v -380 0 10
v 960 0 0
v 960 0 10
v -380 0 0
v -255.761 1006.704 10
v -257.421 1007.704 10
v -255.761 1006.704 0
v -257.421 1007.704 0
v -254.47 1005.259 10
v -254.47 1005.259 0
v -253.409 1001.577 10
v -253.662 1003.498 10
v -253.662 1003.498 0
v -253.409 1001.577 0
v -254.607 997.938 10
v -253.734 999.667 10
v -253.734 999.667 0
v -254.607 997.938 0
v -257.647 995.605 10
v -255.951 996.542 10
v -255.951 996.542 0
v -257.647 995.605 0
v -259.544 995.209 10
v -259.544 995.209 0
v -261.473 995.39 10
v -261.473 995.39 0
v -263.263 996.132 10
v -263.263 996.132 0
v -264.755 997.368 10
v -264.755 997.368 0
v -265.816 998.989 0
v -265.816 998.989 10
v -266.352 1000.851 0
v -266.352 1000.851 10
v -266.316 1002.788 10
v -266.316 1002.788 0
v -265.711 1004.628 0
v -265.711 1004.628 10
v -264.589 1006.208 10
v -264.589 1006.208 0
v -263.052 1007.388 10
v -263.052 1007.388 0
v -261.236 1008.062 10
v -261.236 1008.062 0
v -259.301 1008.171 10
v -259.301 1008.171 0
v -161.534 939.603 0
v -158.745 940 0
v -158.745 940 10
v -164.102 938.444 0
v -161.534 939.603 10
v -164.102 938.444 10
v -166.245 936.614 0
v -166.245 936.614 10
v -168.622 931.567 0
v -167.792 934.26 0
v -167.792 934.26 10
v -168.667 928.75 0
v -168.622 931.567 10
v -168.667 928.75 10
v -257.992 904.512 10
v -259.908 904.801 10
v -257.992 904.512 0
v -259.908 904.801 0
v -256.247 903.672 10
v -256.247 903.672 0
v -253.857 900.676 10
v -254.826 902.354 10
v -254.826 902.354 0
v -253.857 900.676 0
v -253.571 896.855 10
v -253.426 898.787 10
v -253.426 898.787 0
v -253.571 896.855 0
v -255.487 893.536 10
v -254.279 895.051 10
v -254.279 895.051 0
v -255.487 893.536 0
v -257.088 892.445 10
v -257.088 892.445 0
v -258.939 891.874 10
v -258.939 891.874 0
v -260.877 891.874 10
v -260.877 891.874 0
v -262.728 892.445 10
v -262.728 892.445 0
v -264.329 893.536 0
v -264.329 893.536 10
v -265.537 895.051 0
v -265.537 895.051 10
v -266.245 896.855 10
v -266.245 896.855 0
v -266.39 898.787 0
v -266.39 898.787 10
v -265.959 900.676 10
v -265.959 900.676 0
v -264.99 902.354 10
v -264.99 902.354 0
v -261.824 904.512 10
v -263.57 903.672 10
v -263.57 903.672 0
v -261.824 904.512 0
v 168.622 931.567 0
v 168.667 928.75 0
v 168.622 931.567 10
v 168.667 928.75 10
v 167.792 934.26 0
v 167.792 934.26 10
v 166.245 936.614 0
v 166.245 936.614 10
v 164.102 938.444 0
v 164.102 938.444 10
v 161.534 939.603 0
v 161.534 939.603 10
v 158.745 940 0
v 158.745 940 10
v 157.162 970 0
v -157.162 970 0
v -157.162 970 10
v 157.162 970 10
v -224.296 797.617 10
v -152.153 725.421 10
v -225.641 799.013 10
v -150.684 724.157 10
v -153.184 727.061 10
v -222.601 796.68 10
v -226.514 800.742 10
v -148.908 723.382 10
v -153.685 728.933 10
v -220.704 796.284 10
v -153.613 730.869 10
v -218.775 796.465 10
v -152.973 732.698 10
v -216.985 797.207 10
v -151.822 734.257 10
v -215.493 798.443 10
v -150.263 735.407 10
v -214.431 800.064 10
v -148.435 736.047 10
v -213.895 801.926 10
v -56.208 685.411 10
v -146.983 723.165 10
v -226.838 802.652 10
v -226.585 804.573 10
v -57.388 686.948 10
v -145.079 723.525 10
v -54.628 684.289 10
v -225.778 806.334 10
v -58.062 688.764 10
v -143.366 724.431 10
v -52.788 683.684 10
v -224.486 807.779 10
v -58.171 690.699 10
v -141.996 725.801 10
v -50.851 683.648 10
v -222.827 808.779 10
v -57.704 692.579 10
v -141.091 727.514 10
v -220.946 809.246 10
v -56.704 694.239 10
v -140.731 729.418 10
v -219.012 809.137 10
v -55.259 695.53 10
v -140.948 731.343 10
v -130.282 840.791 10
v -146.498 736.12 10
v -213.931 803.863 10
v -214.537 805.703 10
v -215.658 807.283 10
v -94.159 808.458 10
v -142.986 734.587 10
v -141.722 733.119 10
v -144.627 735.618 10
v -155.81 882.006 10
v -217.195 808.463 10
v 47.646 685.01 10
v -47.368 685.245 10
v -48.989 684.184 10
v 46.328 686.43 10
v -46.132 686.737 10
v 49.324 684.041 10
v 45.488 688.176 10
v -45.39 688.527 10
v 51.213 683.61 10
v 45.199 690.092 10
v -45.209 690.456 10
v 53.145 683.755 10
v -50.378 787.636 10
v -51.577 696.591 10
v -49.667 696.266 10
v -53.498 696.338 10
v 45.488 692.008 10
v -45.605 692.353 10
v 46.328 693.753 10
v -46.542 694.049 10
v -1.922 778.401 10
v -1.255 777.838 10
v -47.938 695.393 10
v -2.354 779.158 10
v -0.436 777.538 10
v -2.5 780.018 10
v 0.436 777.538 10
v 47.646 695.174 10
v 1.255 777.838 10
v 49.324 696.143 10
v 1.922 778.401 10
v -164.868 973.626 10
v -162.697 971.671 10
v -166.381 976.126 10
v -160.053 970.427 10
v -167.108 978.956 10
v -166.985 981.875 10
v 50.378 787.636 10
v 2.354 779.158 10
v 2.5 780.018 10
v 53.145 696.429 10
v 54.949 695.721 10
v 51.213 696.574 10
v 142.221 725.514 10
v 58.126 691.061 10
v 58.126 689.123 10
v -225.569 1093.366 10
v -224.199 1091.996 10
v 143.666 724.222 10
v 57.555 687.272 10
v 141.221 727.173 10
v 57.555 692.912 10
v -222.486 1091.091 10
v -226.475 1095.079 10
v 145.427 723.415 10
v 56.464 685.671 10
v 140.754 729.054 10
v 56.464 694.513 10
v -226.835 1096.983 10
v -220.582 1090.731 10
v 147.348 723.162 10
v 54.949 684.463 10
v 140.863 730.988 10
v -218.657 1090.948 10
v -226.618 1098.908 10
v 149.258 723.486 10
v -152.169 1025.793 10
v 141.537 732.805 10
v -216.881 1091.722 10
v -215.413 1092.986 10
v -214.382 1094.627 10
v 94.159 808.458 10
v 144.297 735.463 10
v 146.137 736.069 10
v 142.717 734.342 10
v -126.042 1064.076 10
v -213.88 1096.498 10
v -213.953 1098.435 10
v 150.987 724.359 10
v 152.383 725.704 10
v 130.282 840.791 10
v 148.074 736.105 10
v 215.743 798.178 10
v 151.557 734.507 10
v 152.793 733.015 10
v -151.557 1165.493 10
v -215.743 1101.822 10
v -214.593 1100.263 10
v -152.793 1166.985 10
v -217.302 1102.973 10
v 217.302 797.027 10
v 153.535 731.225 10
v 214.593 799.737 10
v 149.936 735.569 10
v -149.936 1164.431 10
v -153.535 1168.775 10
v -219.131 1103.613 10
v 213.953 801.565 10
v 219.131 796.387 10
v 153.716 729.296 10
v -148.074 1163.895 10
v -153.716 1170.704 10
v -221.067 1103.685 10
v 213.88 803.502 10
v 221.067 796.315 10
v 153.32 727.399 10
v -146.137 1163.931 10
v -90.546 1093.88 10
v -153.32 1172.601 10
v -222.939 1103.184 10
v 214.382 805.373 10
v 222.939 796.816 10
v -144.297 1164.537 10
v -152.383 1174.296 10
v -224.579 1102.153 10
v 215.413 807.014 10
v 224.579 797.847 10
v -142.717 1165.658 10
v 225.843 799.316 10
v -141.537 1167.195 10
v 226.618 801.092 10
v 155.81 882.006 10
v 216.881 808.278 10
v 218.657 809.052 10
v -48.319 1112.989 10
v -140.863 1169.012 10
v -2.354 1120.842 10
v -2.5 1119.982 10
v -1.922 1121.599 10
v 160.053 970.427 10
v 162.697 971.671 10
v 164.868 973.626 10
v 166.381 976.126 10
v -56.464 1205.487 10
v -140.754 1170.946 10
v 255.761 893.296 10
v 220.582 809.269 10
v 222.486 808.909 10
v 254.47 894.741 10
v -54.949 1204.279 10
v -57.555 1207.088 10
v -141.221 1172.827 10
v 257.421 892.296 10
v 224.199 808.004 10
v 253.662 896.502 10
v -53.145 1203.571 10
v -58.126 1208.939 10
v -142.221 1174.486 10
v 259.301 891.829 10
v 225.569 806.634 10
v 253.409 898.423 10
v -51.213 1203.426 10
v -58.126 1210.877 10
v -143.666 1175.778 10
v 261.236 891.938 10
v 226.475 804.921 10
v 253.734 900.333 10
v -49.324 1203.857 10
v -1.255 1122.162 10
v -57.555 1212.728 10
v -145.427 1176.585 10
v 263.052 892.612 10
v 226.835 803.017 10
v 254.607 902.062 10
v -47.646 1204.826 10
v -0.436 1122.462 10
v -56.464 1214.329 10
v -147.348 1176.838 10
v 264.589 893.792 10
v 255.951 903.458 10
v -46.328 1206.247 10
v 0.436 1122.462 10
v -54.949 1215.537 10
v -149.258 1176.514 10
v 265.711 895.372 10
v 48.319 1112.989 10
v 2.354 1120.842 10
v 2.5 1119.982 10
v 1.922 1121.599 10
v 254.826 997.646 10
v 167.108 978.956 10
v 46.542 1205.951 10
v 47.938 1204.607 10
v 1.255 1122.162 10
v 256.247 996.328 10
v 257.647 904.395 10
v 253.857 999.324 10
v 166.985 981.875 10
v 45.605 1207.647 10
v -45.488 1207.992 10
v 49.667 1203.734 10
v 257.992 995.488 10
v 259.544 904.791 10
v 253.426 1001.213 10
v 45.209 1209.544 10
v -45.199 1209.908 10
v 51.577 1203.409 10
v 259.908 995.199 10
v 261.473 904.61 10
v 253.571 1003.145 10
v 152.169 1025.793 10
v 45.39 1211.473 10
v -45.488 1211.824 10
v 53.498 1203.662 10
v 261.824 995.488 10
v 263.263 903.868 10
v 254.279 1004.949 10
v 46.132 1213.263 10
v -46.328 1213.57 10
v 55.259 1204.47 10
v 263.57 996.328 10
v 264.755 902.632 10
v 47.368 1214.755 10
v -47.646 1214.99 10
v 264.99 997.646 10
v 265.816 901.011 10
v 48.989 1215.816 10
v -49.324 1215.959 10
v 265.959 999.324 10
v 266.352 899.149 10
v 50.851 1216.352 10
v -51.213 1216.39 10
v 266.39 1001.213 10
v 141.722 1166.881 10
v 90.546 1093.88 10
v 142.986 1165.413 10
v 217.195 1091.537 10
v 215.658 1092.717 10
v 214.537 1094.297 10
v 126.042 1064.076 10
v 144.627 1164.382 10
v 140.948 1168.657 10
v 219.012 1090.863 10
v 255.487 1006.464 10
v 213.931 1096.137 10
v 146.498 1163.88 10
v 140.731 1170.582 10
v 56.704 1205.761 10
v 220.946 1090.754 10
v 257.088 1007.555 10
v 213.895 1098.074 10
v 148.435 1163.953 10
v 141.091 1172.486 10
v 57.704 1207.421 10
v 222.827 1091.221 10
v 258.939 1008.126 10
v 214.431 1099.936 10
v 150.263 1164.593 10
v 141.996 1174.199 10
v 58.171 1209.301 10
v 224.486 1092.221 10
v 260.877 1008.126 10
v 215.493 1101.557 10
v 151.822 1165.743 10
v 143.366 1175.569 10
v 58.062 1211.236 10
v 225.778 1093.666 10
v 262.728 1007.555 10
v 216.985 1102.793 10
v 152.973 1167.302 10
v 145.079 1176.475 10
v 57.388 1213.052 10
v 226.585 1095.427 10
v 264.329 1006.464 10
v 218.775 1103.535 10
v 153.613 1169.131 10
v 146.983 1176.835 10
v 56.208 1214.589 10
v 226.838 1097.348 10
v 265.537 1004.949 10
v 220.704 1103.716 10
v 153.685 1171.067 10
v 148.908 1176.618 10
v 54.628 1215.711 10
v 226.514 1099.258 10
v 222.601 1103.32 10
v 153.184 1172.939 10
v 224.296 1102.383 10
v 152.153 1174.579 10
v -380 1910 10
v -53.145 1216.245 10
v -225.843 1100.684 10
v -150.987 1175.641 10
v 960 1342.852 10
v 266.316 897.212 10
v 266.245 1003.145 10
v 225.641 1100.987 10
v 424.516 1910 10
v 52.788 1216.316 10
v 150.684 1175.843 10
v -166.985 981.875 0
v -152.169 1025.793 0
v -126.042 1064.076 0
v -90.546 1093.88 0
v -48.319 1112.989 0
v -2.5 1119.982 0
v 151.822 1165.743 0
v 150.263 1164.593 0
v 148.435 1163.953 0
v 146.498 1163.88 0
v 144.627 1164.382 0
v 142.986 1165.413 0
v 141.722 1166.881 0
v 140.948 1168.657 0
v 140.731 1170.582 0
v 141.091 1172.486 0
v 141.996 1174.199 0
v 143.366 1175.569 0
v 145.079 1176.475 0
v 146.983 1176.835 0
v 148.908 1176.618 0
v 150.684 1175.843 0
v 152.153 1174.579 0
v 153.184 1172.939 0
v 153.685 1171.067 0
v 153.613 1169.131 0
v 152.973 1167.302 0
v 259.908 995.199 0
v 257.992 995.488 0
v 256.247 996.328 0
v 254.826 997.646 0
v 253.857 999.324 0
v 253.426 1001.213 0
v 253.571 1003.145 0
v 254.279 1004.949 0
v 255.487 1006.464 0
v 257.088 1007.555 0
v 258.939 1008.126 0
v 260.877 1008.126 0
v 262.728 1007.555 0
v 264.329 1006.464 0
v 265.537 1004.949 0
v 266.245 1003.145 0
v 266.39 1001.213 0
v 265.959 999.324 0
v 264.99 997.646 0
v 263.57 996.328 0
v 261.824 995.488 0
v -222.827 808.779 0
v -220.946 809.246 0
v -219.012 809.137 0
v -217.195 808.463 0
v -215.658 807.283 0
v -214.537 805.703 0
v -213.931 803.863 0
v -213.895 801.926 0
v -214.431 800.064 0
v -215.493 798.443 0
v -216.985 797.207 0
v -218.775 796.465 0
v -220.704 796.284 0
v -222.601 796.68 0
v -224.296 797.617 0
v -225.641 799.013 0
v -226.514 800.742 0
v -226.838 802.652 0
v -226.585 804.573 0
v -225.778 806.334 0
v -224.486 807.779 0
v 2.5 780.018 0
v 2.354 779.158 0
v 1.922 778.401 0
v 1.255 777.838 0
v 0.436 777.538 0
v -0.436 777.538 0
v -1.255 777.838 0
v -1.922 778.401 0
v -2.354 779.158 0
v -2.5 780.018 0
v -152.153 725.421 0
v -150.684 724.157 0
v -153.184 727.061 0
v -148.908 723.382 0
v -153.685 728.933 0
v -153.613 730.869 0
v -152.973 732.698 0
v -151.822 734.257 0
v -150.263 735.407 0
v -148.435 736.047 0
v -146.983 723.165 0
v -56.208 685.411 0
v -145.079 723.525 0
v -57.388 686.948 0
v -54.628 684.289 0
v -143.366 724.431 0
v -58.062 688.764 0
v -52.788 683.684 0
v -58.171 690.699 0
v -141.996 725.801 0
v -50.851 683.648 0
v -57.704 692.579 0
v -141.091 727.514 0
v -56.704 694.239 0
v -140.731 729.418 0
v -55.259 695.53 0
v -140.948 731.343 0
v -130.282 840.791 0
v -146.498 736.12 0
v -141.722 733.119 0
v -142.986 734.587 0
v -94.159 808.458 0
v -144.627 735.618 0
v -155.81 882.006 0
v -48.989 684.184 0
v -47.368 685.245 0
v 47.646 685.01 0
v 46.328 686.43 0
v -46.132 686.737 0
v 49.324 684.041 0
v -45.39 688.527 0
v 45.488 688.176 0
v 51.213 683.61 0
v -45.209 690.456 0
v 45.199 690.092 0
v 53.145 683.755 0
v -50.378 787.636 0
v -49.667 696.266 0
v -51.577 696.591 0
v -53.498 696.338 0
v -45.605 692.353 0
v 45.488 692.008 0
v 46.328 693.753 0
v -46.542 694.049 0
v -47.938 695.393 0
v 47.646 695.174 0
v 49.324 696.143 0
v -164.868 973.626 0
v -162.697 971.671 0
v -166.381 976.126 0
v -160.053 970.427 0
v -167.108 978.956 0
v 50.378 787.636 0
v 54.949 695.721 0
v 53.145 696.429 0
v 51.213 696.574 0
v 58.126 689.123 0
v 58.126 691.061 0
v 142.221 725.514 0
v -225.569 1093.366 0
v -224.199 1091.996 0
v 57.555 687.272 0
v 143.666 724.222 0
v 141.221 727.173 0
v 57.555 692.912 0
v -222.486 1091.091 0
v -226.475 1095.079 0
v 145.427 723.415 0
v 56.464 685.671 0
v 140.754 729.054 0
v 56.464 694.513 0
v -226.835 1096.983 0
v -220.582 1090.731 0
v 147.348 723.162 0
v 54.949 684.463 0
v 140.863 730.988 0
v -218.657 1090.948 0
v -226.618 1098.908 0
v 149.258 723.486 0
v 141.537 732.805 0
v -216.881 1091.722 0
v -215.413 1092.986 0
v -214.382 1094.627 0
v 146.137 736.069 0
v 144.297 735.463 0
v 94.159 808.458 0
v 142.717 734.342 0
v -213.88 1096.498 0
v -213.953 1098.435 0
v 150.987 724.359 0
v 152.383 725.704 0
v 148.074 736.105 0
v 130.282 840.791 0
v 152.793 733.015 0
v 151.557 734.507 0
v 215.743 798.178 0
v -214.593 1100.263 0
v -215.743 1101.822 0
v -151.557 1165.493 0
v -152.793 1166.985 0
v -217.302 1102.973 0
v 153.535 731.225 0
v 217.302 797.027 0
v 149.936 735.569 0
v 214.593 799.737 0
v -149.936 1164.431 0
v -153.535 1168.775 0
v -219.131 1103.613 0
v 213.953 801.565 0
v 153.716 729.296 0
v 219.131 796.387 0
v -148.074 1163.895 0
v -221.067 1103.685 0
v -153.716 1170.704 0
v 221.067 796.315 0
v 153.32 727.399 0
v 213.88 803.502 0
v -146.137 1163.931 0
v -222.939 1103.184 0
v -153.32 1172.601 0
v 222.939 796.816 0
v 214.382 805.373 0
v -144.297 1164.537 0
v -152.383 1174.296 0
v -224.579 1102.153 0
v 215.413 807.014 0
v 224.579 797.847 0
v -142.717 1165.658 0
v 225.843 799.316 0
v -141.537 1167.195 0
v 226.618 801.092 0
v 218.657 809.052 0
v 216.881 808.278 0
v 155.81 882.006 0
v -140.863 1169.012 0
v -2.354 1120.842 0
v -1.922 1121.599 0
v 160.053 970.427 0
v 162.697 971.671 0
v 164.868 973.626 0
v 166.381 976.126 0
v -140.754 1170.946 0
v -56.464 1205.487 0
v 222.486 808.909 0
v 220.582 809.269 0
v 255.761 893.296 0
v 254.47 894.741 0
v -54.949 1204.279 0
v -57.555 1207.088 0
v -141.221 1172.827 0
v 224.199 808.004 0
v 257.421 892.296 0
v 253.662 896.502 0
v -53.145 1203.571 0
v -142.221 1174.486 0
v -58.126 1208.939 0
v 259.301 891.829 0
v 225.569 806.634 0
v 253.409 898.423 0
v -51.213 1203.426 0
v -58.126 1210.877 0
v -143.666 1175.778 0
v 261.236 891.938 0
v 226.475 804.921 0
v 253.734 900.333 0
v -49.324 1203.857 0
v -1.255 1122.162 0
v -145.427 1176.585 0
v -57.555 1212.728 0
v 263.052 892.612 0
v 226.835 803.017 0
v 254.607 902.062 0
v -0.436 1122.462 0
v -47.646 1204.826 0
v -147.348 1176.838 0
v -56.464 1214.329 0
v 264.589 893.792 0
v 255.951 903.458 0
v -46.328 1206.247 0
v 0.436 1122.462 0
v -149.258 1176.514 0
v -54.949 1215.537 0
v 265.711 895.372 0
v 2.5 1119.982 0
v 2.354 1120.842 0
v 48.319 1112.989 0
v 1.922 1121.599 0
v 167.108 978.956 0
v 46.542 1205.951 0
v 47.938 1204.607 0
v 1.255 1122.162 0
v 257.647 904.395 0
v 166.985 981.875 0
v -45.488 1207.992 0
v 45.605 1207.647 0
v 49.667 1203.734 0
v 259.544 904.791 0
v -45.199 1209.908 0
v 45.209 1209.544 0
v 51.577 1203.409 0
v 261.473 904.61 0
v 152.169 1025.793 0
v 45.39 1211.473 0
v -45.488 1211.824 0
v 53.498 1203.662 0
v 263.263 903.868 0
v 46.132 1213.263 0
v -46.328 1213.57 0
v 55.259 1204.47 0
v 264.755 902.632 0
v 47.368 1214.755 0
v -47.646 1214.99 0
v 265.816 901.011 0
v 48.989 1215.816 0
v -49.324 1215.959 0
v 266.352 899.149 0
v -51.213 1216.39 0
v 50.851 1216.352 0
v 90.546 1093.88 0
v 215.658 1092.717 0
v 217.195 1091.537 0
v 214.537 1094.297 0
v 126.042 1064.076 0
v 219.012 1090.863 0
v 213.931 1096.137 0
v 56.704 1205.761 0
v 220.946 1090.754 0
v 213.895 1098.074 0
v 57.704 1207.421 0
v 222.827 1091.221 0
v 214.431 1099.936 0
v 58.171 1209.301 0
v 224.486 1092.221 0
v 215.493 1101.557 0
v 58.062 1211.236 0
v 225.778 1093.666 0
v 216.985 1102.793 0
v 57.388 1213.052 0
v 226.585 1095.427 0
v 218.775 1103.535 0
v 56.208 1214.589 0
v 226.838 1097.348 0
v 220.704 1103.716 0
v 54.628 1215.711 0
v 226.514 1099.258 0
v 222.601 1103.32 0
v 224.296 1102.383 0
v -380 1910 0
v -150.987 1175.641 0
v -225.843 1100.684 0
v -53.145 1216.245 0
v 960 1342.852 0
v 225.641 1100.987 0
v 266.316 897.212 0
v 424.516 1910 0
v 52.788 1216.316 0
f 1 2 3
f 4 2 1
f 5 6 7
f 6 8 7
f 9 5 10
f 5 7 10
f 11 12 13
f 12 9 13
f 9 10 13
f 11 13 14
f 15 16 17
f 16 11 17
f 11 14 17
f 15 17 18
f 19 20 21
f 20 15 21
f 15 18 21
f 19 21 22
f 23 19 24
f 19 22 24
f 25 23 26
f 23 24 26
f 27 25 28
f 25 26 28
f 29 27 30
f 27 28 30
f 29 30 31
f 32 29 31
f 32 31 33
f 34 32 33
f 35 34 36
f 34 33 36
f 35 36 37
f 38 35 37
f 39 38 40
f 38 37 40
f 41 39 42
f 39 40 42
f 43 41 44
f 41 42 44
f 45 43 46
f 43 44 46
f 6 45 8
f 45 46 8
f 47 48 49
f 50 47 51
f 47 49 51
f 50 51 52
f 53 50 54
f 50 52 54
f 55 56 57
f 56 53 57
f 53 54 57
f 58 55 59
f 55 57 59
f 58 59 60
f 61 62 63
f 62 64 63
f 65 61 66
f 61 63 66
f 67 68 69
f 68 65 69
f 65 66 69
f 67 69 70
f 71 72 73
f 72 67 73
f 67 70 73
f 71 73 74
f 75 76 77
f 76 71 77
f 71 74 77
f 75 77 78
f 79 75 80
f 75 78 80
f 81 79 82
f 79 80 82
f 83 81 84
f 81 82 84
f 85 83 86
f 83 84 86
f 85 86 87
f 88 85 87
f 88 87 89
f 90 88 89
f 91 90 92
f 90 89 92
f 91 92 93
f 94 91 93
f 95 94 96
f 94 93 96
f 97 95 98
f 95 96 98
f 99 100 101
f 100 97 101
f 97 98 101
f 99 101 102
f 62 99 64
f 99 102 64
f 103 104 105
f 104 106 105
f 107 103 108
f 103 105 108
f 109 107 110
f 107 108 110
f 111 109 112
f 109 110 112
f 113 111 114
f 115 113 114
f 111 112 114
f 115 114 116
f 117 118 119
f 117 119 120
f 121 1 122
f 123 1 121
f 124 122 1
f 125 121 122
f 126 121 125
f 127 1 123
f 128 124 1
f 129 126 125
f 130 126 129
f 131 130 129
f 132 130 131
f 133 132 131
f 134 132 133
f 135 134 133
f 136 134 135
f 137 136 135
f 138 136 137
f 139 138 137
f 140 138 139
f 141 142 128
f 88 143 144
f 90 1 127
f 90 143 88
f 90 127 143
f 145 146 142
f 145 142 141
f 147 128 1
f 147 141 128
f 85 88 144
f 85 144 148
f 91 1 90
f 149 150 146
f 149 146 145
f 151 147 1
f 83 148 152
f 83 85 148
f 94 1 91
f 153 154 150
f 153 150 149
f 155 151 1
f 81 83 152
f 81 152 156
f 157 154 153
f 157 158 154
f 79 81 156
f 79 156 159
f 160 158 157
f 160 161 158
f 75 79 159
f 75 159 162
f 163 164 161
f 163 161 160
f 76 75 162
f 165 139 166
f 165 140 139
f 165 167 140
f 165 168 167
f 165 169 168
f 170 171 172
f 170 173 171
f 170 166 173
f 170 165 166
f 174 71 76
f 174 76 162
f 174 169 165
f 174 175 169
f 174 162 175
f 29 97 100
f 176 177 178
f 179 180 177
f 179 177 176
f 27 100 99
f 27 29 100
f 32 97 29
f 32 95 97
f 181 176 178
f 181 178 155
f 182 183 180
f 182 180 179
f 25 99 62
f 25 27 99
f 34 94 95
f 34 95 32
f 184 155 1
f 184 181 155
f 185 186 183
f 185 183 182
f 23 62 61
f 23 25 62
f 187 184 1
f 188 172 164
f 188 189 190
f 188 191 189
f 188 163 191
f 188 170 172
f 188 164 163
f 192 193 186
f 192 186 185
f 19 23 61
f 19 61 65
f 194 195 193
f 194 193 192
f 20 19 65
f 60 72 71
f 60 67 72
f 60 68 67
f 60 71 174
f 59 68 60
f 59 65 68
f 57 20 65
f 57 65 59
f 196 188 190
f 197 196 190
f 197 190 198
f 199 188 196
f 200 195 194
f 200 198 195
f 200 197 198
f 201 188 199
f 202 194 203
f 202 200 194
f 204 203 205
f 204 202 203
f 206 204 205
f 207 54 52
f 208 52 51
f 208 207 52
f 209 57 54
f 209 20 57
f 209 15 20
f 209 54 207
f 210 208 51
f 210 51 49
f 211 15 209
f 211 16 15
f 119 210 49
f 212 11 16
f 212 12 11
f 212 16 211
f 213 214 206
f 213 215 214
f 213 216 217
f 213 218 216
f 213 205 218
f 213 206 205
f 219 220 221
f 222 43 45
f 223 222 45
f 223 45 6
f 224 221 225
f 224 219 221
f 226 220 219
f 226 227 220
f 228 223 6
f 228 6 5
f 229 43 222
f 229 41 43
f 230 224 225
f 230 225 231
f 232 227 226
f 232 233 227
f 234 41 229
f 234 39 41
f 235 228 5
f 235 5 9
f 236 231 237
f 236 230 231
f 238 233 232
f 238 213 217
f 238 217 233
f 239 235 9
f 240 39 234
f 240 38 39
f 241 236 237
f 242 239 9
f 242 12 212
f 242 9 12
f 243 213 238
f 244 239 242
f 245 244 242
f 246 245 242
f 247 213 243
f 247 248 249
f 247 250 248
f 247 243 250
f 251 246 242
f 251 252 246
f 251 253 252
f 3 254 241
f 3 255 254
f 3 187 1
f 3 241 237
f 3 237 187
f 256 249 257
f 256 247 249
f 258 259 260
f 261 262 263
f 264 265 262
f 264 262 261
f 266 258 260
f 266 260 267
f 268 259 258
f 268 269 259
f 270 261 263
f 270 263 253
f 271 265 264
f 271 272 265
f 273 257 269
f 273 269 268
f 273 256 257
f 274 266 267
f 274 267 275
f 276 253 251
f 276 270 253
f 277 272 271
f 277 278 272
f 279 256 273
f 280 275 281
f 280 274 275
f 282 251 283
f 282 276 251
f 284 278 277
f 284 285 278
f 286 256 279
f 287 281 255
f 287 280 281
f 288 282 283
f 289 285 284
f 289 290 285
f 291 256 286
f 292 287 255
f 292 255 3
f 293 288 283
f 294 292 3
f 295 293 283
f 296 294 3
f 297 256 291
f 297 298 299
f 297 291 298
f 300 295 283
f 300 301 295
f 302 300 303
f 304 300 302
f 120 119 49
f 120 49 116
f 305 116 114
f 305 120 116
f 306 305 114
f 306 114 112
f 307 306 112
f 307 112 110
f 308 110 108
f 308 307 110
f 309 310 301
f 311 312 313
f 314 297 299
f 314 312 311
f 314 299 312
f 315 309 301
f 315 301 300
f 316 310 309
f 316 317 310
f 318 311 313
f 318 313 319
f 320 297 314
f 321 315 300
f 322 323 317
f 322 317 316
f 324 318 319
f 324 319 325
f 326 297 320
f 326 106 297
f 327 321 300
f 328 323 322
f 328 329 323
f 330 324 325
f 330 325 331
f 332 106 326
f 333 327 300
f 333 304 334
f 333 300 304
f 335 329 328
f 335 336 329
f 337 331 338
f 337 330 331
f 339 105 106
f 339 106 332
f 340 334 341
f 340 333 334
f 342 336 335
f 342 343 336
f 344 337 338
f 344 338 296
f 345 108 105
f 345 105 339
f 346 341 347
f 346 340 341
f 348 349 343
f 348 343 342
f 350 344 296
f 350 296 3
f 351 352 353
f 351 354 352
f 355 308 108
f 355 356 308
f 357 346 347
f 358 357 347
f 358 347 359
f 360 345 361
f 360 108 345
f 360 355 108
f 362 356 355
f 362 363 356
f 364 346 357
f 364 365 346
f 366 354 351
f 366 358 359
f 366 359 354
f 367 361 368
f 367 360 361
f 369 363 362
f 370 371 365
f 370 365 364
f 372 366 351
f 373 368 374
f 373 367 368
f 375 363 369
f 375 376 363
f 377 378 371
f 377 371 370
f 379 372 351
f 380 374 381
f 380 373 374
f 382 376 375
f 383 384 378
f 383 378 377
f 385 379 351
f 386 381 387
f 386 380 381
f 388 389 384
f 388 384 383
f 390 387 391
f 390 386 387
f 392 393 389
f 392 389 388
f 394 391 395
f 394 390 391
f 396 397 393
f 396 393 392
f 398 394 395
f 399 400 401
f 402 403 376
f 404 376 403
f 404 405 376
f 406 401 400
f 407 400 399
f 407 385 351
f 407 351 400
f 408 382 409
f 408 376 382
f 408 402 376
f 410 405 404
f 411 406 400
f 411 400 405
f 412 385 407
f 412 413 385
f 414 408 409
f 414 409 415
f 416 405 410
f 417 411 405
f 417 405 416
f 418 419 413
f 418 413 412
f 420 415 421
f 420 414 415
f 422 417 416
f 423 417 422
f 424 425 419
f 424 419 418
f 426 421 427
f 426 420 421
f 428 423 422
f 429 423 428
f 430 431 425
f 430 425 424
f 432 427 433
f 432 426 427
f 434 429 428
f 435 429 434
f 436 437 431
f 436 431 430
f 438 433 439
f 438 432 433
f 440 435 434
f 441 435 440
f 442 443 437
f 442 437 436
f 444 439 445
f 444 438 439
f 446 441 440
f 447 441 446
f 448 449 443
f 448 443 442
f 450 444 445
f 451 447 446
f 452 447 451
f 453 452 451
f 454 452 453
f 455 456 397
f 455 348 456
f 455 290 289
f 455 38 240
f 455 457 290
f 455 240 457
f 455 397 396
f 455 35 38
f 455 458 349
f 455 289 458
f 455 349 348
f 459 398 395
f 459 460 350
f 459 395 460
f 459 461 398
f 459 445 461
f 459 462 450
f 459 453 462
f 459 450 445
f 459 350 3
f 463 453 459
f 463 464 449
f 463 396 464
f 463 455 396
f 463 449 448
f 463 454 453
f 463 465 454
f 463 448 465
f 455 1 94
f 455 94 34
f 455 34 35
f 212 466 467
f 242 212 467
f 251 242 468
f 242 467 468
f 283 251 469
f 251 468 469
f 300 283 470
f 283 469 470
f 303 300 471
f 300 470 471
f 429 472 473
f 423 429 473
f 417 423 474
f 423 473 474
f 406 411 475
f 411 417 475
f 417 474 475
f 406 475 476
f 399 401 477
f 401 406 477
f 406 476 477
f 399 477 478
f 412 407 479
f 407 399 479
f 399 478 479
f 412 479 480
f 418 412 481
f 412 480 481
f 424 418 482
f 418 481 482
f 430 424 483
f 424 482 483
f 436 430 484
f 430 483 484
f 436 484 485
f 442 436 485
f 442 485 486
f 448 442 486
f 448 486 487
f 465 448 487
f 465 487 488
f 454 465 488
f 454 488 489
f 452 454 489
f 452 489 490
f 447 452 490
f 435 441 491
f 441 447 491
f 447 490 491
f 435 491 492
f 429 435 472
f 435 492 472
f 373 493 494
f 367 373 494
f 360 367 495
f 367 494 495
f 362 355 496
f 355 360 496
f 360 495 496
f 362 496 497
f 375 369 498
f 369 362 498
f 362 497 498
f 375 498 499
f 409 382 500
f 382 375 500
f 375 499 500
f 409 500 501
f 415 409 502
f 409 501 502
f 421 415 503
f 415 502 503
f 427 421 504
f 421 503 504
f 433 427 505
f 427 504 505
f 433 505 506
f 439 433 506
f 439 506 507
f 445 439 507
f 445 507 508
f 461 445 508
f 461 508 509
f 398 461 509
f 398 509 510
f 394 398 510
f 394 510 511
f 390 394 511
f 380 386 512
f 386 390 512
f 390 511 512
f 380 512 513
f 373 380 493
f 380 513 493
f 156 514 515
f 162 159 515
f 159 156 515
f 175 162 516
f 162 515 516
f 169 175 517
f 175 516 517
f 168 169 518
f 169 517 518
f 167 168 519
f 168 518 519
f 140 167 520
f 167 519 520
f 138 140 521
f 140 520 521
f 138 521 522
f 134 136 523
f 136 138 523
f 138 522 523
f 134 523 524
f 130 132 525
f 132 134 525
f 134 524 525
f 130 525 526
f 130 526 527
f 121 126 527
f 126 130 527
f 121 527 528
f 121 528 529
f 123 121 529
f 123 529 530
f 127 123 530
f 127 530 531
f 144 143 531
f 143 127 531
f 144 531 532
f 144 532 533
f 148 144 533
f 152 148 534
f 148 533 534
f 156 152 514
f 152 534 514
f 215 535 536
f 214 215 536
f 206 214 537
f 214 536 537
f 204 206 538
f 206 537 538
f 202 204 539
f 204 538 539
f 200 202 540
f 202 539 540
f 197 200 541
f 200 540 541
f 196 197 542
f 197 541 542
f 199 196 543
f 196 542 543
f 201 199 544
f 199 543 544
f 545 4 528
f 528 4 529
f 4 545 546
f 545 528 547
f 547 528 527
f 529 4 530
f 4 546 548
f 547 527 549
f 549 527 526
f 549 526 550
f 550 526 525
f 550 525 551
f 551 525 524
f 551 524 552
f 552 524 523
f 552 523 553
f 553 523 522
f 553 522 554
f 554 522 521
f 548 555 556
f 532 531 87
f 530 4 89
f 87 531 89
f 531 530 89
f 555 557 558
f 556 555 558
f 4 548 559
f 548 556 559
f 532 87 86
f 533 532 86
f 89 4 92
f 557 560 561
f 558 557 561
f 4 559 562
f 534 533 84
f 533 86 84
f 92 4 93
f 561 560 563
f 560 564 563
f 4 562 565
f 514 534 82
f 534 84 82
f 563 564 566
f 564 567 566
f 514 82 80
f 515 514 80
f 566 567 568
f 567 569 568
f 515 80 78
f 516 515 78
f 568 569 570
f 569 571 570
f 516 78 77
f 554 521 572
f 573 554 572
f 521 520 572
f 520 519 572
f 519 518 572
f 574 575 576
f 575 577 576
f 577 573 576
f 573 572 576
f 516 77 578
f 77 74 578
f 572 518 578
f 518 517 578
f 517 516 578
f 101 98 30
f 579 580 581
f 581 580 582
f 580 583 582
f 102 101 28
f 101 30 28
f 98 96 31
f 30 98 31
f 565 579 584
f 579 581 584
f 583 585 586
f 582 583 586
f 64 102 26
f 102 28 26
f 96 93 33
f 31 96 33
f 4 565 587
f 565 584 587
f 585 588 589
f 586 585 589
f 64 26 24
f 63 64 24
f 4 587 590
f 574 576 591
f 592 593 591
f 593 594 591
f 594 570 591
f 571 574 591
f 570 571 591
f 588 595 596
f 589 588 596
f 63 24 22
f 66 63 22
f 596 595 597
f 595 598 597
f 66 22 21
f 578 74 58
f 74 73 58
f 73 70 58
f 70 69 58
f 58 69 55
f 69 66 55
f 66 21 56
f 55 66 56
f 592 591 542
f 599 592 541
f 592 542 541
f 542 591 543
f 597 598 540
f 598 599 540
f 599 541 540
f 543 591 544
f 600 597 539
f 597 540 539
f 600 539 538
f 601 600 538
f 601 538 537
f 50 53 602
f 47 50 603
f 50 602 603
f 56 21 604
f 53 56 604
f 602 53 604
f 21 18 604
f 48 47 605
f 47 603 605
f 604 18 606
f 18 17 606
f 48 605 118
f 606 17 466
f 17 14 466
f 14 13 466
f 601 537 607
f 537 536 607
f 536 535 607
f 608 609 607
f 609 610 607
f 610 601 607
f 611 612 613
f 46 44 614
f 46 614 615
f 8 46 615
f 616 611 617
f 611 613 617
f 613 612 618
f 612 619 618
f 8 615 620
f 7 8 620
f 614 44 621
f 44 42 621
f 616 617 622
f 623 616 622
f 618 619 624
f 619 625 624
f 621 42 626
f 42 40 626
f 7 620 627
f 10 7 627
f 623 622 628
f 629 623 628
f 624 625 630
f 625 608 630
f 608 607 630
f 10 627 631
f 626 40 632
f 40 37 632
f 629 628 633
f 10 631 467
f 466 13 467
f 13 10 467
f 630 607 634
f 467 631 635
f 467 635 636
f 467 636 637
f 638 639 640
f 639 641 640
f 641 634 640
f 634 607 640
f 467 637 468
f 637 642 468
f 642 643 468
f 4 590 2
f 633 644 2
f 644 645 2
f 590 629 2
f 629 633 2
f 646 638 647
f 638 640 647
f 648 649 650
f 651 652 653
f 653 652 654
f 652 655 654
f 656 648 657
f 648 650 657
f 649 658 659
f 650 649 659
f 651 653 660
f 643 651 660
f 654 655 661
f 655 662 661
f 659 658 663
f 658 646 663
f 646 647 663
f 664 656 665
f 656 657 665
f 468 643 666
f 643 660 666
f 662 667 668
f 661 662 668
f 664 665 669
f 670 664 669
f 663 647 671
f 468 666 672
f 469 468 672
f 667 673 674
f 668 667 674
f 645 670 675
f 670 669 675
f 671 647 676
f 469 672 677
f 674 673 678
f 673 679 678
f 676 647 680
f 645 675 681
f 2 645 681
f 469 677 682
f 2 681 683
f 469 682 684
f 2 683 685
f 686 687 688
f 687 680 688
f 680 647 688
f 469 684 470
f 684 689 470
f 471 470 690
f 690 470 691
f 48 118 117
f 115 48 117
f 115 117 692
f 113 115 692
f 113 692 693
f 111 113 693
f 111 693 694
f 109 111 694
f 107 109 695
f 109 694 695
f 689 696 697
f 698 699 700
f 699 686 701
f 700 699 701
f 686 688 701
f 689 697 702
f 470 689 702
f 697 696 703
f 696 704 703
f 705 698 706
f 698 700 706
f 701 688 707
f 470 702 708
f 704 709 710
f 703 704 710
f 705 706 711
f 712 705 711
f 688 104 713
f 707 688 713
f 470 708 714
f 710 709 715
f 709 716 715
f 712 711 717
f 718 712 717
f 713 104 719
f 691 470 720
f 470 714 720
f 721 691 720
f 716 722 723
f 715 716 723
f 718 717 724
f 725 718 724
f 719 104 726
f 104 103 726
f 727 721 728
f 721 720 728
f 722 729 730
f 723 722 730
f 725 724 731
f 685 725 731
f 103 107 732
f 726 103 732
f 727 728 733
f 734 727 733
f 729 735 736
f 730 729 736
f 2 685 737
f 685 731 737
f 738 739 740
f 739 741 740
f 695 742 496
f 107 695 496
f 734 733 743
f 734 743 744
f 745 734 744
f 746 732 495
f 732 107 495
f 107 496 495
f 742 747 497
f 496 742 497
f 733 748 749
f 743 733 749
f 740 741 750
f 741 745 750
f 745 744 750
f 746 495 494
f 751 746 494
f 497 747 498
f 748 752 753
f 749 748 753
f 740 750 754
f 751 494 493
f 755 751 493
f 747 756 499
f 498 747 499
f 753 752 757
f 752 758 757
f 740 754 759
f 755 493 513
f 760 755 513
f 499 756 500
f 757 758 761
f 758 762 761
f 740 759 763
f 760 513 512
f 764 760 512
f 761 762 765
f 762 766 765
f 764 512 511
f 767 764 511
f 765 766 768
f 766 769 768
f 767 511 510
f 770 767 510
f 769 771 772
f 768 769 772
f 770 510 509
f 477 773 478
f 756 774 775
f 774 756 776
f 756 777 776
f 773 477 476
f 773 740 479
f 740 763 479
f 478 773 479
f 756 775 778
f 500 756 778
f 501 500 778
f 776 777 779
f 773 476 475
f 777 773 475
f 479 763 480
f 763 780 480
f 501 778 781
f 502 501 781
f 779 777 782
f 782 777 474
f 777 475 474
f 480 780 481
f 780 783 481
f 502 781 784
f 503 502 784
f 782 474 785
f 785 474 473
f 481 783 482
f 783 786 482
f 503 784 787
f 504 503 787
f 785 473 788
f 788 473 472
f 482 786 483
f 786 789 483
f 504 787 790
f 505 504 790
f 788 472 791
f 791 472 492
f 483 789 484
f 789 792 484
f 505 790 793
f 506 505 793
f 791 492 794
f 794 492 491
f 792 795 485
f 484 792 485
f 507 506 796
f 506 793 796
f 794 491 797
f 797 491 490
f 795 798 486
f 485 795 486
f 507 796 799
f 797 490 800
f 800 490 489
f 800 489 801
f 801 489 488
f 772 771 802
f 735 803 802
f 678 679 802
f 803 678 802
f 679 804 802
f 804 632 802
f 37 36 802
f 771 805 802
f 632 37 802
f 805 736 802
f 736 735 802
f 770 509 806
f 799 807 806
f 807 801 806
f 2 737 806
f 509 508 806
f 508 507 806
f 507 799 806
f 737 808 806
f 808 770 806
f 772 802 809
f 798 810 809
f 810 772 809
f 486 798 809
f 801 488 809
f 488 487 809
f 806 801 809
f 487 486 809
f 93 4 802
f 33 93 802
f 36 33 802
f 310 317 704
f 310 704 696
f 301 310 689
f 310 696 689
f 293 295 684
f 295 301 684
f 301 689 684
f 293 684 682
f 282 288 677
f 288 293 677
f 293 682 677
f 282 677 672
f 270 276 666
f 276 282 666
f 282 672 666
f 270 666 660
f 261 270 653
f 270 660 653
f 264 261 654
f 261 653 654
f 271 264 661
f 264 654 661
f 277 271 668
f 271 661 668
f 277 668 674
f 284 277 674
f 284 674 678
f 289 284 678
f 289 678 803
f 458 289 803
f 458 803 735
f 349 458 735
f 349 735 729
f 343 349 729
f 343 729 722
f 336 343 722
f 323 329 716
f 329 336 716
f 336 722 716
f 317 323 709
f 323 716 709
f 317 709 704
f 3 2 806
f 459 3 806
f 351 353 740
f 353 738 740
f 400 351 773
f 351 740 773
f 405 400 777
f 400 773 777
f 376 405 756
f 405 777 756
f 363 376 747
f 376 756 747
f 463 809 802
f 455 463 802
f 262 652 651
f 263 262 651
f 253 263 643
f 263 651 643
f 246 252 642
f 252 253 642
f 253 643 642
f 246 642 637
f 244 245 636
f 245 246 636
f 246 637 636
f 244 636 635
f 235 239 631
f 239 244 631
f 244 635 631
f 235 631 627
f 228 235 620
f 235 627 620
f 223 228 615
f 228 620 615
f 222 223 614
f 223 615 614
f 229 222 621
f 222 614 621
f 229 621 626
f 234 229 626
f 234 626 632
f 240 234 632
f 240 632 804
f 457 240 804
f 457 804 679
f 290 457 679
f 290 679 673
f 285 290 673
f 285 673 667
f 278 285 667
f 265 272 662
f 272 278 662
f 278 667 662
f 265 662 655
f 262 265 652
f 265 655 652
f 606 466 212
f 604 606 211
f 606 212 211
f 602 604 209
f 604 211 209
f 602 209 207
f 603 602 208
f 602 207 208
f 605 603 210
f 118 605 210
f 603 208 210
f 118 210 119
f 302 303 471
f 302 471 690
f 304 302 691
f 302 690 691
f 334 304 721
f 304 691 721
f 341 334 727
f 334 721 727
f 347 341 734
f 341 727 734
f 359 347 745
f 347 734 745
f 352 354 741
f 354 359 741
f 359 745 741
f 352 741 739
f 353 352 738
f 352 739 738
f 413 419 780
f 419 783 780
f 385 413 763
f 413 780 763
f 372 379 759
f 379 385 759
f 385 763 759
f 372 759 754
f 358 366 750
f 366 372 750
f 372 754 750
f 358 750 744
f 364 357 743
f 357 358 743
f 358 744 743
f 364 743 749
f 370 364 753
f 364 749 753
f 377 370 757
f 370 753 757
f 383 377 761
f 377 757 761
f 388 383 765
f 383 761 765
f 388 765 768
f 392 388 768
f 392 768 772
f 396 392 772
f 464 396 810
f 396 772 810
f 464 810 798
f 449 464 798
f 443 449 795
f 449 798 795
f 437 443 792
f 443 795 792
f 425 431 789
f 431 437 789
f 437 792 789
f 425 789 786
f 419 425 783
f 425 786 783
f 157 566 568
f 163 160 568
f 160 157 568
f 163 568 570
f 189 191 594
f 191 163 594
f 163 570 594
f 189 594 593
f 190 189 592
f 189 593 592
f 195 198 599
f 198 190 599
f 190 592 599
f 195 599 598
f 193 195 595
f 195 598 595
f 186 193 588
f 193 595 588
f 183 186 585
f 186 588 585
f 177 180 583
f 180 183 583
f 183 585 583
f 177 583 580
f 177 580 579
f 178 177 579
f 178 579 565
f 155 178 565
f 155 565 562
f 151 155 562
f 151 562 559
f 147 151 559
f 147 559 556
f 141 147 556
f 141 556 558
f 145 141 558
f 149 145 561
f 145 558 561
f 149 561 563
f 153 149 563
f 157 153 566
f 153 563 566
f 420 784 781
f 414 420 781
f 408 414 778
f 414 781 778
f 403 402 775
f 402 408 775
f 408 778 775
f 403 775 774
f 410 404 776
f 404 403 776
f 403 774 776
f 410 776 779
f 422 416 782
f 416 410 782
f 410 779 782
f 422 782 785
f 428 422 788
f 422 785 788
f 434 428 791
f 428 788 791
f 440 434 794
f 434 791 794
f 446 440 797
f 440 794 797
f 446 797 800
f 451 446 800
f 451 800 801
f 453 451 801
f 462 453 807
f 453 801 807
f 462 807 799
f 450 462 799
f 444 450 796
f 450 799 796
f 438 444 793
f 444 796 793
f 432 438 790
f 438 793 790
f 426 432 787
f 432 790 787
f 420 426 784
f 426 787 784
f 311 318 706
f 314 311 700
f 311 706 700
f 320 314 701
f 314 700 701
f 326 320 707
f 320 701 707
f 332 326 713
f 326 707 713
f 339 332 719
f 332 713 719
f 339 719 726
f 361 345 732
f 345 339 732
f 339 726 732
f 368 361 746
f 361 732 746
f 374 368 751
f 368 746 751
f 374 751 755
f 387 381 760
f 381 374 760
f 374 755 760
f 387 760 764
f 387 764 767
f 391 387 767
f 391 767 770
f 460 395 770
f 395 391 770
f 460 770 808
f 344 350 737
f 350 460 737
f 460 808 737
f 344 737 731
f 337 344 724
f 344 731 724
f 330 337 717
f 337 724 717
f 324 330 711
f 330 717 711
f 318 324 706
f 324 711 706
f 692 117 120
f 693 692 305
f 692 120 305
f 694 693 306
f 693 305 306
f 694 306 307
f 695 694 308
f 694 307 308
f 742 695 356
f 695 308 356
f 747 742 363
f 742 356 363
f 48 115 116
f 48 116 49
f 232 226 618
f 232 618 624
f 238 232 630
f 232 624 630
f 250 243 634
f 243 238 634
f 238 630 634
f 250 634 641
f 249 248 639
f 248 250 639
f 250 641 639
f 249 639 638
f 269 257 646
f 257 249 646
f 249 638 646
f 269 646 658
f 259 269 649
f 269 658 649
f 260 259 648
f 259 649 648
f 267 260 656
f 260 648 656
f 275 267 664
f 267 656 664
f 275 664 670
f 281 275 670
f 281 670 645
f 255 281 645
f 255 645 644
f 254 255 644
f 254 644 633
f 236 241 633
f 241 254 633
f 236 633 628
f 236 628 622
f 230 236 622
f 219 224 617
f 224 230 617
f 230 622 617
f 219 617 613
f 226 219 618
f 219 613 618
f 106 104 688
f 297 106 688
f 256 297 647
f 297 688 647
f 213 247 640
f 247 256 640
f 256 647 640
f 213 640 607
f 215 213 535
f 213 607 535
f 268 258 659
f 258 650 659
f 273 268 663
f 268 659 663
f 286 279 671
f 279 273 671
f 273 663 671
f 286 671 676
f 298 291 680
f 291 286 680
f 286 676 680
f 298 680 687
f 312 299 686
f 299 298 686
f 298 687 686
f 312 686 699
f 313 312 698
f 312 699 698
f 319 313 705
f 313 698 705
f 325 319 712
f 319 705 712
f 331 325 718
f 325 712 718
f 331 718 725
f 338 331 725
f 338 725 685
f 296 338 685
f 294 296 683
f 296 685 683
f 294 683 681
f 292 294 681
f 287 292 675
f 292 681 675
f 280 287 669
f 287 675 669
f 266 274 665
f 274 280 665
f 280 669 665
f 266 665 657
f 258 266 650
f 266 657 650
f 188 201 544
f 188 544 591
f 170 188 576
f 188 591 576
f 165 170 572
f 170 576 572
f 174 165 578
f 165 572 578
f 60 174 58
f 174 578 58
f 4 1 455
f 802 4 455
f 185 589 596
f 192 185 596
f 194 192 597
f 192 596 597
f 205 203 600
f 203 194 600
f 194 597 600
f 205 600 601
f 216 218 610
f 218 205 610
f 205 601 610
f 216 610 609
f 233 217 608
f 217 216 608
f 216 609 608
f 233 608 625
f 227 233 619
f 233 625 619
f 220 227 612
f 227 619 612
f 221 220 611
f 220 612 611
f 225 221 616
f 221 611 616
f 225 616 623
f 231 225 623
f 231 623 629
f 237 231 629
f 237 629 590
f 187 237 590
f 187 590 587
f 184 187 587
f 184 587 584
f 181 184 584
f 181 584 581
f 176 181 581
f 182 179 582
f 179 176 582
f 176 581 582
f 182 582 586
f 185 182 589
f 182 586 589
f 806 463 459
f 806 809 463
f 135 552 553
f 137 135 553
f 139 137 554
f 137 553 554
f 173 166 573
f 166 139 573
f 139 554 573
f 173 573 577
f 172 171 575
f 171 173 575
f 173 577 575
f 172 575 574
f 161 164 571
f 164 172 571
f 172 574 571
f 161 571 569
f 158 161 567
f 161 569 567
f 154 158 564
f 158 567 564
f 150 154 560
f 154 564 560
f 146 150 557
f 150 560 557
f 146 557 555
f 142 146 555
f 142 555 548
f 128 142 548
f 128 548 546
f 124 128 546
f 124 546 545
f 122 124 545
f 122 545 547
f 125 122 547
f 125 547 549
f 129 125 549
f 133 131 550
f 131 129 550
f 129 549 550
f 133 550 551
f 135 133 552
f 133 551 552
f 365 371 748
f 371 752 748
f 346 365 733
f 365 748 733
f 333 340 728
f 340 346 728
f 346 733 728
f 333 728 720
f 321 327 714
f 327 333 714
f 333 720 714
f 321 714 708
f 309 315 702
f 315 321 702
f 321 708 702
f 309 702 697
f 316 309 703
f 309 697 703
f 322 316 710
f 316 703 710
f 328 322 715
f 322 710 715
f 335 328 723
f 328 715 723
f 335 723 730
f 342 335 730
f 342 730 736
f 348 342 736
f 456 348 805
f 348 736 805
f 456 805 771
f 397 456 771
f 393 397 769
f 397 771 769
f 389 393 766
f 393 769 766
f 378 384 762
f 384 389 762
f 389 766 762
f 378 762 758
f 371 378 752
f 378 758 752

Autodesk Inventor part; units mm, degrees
ref_plane "YZ Plane" through (0, 0, 0) normal (1, 0, 0) x (0, 1, 0)
ref_plane "XZ Plane" through (0, 0, 0) normal (0, 1, 0) x (-1, 0, 0)
ref_plane "XY Plane" through (0, 0, 0) normal (0, 0, 1) x (1, 0, 0)
sketch "Sketch1" plane through (0, 0, 0) normal (0, 0, 1) x (1, 0, 0)
  line L0 (0, 0) -> (0, 1910) construction
  line L1 (424.5155, 1910) -> (-415.4845, 1910)
  line L2 (-415.4845, 1910) -> (-1180, 1150)
  line L3 (-1180, 0) -> (-1180, 1150)
  line L4 (960, 0) -> (960, 1342.8524)
  line L5 (424.5155, 1910) -> (960, 1342.8524)
  circle A0 centre (0, 950) radius 265 construction
  line L6 (960, 0) -> (-1180, 0)
  circle A1 centre (-1701.6377, -269.2167) radius 188.5 construction
  circle A2 centre (-800, 80) radius 55
  circle A3 centre (0, 950) radius 170
  line L7 (0, 1215) -> (0, 1120) construction
  line L8 (-721.2646, 955) -> (721.2646, 955) construction
  line L9 (-169.9265, 955) -> (-174.9265, 955) construction
  line L10 (-174.9265, 960) -> (-174.9265, 950)
  line L11 (-174.9265, 960) -> (-169.7056, 960)
  line L12 (-174.9265, 950) -> (-170, 950)
  line L13 (169.9265, 955) -> (174.9265, 955) construction
  line L14 (174.9265, 960) -> (174.9265, 950)
  line L15 (169.7056, 960) -> (174.9265, 960)
  line L16 (174.9265, 950) -> (170, 950)
  line L17 (-174.9265, 970) -> (174.9265, 970)
  line L18 (174.9265, 970) -> (174.9265, 940)
  line L19 (174.9265, 940) -> (-174.9265, 940)
  line L20 (-174.9265, 940) -> (-174.9265, 970)
  arc A4 (-2.4999, 780.0184) -> (2.4999, 780.0184) centre (0, 780) ccw
  arc A5 (2.4999, 1119.9816) -> (-2.4999, 1119.9816) centre (0, 1120) ccw
  point P0 (0, 955)
  point P1 (-169.7056, 940)
  point P2 (169.7056, 940)
  point P3 (168.8194, 970)
  point P4 (-168.8194, 970)
  dimension "d52" = 530
  dimension "d72" = 340
  dimension "d1" = 840
  dimension "d3" = 1150
  dimension "d12" = 1180
  dimension "d13" = 950
  dimension "d14" = 110
  dimension "d15" = 1910
  dimension "d17" = -521.6377
  dimension "d18" = 377
  dimension "d19" = -269.2167
  dimension "d34" = 380
  dimension "d35" = 80
  dimension "d37" = 2140
  dimension "d53" = 5
  dimension "d54" = 10
  dimension "d55" = 30
  dimension "d67" = 5
  dimension "d68" = 5
  dimension "d69" = 780
  dimension "d71" = 1078
extrude "Extrusion1" add sketch "Sketch1" along normal blind 10 contours L5 L4 L6 L3 L2 L1 | A3 L19 L17 | L16 L18 L19 A3 | A3 L15 L14 L16 | A3 L17 L18 L15 | L19 L20 L12 A3 | A3 L11 L20 L17 | L12 L10 L11 A3
fillet "Fillet1" radius 10 4 edges at (-168.8194, 970, 5) (-169.7056, 940, 5) (168.8194, 970, 5) (169.7056, 940, 5)
sketch "Sketch4" plane through (0, 0, 0) normal (0, 0, 1) x (1, 0, 0)
  circle A0 centre (-51.6989, 1209.9081) radius 6.5
  arc A1 (-2.4999, 1119.9816) -> (-166.985, 981.875) centre (0, 950) ccw projected
  line L0 (0, 950) -> (0, 1196.7062) construction
  line L1 (-51.6989, 1209.9081) -> (0, 950) construction
  point P0 (0, 0)
  point P1 (-5, 1149.9375)
  dimension "d59" = 265
  dimension "d60" = 13
  dimension "d61" = 11.25
extrude "Extrusion4" cut sketch "Sketch4" along normal blind 10
pattern_circular "Circular Pattern3" count 16 over 360 about axis through (0, 950, 0) along (0, 0, 1) of "Extrusion4"
sketch "Sketch5" plane through (0, 0, 10) normal (0, 0, 1) x (1, 0, 0)
  circle A0 centre (51.6989, 1209.9081) radius 6.5 projected
  circle A1 centre (147.2261, 1170.3394) radius 6.5 projected
  circle A2 centre (220.3394, 1097.2261) radius 6.5 projected
  circle A3 centre (259.9081, 1001.6989) radius 6.5 projected
  circle A4 centre (259.9081, 898.3011) radius 6.5 projected
  circle A5 centre (220.3394, 802.7739) radius 6.5 projected
  circle A6 centre (147.2261, 729.6606) radius 6.5 projected
  circle A7 centre (51.6989, 690.0919) radius 6.5 projected
  circle A8 centre (-51.6989, 690.0919) radius 6.5 projected
  circle A9 centre (-147.2261, 729.6606) radius 6.5 projected
  circle A10 centre (-220.3394, 802.7739) radius 6.5 projected
  circle A11 centre (-259.9081, 898.3011) radius 6.5 projected
  circle A12 centre (-259.9081, 1001.6989) radius 6.5 projected
  circle A13 centre (-220.3394, 1097.2261) radius 6.5 projected
  circle A14 centre (-147.2261, 1170.3394) radius 6.5 projected
  circle A15 centre (-51.6989, 1209.9081) radius 6.5 projected
  line L0 (960, 1342.8524) -> (424.5155, 1910) projected
  line L1 (424.5155, 1910) -> (-415.4845, 1910) projected
  line L2 (-415.4845, 1910) -> (-1180, 1150) projected
  line L3 (-1180, 1150) -> (-1180, 0) projected
  line L4 (-1180, 0) -> (960, 0) projected
  line L5 (960, 0) -> (960, 1342.8524) projected
  arc A16 (2.4999, 780.0184) -> (168.6666, 928.75) centre (0, 950) ccw projected
  arc A17 (-2.4999, 780.0184) -> (2.4999, 780.0184) centre (0, 780) ccw projected
  arc A18 (-168.6666, 928.75) -> (-2.4999, 780.0184) centre (0, 950) ccw projected
  arc A19 (-158.7451, 940) -> (-168.6666, 928.75) centre (-158.7451, 930) ccw projected
  line L6 (-158.7451, 940) -> (158.7451, 940) projected
  arc A20 (168.6666, 928.75) -> (158.7451, 940) centre (158.7451, 930) ccw projected
  circle A21 centre (-800, 80) radius 55 projected
  line L7 (157.1623, 970) -> (-157.1623, 970) projected
  arc A22 (-166.985, 981.875) -> (-157.1623, 970) centre (-157.1623, 980) ccw projected
  arc A23 (-2.4999, 1119.9816) -> (-166.985, 981.875) centre (0, 950) ccw projected
  arc A24 (2.4999, 1119.9816) -> (-2.4999, 1119.9816) centre (0, 1120) ccw projected
  arc A25 (166.985, 981.875) -> (2.4999, 1119.9816) centre (0, 950) ccw projected
  arc A26 (157.1623, 970) -> (166.985, 981.875) centre (157.1623, 980) ccw projected
  line L8 (-380, 0) -> (-380, 1910)
  point P0 (0, 0)
  dimension "d73" = 1340
extrude "Extrusion5" cut sketch "Sketch5" against normal through all contours L8 L4 L3 L2 L1
properties part number "ДМФ 012 Стенка Корма ПРАВ v2.0"
